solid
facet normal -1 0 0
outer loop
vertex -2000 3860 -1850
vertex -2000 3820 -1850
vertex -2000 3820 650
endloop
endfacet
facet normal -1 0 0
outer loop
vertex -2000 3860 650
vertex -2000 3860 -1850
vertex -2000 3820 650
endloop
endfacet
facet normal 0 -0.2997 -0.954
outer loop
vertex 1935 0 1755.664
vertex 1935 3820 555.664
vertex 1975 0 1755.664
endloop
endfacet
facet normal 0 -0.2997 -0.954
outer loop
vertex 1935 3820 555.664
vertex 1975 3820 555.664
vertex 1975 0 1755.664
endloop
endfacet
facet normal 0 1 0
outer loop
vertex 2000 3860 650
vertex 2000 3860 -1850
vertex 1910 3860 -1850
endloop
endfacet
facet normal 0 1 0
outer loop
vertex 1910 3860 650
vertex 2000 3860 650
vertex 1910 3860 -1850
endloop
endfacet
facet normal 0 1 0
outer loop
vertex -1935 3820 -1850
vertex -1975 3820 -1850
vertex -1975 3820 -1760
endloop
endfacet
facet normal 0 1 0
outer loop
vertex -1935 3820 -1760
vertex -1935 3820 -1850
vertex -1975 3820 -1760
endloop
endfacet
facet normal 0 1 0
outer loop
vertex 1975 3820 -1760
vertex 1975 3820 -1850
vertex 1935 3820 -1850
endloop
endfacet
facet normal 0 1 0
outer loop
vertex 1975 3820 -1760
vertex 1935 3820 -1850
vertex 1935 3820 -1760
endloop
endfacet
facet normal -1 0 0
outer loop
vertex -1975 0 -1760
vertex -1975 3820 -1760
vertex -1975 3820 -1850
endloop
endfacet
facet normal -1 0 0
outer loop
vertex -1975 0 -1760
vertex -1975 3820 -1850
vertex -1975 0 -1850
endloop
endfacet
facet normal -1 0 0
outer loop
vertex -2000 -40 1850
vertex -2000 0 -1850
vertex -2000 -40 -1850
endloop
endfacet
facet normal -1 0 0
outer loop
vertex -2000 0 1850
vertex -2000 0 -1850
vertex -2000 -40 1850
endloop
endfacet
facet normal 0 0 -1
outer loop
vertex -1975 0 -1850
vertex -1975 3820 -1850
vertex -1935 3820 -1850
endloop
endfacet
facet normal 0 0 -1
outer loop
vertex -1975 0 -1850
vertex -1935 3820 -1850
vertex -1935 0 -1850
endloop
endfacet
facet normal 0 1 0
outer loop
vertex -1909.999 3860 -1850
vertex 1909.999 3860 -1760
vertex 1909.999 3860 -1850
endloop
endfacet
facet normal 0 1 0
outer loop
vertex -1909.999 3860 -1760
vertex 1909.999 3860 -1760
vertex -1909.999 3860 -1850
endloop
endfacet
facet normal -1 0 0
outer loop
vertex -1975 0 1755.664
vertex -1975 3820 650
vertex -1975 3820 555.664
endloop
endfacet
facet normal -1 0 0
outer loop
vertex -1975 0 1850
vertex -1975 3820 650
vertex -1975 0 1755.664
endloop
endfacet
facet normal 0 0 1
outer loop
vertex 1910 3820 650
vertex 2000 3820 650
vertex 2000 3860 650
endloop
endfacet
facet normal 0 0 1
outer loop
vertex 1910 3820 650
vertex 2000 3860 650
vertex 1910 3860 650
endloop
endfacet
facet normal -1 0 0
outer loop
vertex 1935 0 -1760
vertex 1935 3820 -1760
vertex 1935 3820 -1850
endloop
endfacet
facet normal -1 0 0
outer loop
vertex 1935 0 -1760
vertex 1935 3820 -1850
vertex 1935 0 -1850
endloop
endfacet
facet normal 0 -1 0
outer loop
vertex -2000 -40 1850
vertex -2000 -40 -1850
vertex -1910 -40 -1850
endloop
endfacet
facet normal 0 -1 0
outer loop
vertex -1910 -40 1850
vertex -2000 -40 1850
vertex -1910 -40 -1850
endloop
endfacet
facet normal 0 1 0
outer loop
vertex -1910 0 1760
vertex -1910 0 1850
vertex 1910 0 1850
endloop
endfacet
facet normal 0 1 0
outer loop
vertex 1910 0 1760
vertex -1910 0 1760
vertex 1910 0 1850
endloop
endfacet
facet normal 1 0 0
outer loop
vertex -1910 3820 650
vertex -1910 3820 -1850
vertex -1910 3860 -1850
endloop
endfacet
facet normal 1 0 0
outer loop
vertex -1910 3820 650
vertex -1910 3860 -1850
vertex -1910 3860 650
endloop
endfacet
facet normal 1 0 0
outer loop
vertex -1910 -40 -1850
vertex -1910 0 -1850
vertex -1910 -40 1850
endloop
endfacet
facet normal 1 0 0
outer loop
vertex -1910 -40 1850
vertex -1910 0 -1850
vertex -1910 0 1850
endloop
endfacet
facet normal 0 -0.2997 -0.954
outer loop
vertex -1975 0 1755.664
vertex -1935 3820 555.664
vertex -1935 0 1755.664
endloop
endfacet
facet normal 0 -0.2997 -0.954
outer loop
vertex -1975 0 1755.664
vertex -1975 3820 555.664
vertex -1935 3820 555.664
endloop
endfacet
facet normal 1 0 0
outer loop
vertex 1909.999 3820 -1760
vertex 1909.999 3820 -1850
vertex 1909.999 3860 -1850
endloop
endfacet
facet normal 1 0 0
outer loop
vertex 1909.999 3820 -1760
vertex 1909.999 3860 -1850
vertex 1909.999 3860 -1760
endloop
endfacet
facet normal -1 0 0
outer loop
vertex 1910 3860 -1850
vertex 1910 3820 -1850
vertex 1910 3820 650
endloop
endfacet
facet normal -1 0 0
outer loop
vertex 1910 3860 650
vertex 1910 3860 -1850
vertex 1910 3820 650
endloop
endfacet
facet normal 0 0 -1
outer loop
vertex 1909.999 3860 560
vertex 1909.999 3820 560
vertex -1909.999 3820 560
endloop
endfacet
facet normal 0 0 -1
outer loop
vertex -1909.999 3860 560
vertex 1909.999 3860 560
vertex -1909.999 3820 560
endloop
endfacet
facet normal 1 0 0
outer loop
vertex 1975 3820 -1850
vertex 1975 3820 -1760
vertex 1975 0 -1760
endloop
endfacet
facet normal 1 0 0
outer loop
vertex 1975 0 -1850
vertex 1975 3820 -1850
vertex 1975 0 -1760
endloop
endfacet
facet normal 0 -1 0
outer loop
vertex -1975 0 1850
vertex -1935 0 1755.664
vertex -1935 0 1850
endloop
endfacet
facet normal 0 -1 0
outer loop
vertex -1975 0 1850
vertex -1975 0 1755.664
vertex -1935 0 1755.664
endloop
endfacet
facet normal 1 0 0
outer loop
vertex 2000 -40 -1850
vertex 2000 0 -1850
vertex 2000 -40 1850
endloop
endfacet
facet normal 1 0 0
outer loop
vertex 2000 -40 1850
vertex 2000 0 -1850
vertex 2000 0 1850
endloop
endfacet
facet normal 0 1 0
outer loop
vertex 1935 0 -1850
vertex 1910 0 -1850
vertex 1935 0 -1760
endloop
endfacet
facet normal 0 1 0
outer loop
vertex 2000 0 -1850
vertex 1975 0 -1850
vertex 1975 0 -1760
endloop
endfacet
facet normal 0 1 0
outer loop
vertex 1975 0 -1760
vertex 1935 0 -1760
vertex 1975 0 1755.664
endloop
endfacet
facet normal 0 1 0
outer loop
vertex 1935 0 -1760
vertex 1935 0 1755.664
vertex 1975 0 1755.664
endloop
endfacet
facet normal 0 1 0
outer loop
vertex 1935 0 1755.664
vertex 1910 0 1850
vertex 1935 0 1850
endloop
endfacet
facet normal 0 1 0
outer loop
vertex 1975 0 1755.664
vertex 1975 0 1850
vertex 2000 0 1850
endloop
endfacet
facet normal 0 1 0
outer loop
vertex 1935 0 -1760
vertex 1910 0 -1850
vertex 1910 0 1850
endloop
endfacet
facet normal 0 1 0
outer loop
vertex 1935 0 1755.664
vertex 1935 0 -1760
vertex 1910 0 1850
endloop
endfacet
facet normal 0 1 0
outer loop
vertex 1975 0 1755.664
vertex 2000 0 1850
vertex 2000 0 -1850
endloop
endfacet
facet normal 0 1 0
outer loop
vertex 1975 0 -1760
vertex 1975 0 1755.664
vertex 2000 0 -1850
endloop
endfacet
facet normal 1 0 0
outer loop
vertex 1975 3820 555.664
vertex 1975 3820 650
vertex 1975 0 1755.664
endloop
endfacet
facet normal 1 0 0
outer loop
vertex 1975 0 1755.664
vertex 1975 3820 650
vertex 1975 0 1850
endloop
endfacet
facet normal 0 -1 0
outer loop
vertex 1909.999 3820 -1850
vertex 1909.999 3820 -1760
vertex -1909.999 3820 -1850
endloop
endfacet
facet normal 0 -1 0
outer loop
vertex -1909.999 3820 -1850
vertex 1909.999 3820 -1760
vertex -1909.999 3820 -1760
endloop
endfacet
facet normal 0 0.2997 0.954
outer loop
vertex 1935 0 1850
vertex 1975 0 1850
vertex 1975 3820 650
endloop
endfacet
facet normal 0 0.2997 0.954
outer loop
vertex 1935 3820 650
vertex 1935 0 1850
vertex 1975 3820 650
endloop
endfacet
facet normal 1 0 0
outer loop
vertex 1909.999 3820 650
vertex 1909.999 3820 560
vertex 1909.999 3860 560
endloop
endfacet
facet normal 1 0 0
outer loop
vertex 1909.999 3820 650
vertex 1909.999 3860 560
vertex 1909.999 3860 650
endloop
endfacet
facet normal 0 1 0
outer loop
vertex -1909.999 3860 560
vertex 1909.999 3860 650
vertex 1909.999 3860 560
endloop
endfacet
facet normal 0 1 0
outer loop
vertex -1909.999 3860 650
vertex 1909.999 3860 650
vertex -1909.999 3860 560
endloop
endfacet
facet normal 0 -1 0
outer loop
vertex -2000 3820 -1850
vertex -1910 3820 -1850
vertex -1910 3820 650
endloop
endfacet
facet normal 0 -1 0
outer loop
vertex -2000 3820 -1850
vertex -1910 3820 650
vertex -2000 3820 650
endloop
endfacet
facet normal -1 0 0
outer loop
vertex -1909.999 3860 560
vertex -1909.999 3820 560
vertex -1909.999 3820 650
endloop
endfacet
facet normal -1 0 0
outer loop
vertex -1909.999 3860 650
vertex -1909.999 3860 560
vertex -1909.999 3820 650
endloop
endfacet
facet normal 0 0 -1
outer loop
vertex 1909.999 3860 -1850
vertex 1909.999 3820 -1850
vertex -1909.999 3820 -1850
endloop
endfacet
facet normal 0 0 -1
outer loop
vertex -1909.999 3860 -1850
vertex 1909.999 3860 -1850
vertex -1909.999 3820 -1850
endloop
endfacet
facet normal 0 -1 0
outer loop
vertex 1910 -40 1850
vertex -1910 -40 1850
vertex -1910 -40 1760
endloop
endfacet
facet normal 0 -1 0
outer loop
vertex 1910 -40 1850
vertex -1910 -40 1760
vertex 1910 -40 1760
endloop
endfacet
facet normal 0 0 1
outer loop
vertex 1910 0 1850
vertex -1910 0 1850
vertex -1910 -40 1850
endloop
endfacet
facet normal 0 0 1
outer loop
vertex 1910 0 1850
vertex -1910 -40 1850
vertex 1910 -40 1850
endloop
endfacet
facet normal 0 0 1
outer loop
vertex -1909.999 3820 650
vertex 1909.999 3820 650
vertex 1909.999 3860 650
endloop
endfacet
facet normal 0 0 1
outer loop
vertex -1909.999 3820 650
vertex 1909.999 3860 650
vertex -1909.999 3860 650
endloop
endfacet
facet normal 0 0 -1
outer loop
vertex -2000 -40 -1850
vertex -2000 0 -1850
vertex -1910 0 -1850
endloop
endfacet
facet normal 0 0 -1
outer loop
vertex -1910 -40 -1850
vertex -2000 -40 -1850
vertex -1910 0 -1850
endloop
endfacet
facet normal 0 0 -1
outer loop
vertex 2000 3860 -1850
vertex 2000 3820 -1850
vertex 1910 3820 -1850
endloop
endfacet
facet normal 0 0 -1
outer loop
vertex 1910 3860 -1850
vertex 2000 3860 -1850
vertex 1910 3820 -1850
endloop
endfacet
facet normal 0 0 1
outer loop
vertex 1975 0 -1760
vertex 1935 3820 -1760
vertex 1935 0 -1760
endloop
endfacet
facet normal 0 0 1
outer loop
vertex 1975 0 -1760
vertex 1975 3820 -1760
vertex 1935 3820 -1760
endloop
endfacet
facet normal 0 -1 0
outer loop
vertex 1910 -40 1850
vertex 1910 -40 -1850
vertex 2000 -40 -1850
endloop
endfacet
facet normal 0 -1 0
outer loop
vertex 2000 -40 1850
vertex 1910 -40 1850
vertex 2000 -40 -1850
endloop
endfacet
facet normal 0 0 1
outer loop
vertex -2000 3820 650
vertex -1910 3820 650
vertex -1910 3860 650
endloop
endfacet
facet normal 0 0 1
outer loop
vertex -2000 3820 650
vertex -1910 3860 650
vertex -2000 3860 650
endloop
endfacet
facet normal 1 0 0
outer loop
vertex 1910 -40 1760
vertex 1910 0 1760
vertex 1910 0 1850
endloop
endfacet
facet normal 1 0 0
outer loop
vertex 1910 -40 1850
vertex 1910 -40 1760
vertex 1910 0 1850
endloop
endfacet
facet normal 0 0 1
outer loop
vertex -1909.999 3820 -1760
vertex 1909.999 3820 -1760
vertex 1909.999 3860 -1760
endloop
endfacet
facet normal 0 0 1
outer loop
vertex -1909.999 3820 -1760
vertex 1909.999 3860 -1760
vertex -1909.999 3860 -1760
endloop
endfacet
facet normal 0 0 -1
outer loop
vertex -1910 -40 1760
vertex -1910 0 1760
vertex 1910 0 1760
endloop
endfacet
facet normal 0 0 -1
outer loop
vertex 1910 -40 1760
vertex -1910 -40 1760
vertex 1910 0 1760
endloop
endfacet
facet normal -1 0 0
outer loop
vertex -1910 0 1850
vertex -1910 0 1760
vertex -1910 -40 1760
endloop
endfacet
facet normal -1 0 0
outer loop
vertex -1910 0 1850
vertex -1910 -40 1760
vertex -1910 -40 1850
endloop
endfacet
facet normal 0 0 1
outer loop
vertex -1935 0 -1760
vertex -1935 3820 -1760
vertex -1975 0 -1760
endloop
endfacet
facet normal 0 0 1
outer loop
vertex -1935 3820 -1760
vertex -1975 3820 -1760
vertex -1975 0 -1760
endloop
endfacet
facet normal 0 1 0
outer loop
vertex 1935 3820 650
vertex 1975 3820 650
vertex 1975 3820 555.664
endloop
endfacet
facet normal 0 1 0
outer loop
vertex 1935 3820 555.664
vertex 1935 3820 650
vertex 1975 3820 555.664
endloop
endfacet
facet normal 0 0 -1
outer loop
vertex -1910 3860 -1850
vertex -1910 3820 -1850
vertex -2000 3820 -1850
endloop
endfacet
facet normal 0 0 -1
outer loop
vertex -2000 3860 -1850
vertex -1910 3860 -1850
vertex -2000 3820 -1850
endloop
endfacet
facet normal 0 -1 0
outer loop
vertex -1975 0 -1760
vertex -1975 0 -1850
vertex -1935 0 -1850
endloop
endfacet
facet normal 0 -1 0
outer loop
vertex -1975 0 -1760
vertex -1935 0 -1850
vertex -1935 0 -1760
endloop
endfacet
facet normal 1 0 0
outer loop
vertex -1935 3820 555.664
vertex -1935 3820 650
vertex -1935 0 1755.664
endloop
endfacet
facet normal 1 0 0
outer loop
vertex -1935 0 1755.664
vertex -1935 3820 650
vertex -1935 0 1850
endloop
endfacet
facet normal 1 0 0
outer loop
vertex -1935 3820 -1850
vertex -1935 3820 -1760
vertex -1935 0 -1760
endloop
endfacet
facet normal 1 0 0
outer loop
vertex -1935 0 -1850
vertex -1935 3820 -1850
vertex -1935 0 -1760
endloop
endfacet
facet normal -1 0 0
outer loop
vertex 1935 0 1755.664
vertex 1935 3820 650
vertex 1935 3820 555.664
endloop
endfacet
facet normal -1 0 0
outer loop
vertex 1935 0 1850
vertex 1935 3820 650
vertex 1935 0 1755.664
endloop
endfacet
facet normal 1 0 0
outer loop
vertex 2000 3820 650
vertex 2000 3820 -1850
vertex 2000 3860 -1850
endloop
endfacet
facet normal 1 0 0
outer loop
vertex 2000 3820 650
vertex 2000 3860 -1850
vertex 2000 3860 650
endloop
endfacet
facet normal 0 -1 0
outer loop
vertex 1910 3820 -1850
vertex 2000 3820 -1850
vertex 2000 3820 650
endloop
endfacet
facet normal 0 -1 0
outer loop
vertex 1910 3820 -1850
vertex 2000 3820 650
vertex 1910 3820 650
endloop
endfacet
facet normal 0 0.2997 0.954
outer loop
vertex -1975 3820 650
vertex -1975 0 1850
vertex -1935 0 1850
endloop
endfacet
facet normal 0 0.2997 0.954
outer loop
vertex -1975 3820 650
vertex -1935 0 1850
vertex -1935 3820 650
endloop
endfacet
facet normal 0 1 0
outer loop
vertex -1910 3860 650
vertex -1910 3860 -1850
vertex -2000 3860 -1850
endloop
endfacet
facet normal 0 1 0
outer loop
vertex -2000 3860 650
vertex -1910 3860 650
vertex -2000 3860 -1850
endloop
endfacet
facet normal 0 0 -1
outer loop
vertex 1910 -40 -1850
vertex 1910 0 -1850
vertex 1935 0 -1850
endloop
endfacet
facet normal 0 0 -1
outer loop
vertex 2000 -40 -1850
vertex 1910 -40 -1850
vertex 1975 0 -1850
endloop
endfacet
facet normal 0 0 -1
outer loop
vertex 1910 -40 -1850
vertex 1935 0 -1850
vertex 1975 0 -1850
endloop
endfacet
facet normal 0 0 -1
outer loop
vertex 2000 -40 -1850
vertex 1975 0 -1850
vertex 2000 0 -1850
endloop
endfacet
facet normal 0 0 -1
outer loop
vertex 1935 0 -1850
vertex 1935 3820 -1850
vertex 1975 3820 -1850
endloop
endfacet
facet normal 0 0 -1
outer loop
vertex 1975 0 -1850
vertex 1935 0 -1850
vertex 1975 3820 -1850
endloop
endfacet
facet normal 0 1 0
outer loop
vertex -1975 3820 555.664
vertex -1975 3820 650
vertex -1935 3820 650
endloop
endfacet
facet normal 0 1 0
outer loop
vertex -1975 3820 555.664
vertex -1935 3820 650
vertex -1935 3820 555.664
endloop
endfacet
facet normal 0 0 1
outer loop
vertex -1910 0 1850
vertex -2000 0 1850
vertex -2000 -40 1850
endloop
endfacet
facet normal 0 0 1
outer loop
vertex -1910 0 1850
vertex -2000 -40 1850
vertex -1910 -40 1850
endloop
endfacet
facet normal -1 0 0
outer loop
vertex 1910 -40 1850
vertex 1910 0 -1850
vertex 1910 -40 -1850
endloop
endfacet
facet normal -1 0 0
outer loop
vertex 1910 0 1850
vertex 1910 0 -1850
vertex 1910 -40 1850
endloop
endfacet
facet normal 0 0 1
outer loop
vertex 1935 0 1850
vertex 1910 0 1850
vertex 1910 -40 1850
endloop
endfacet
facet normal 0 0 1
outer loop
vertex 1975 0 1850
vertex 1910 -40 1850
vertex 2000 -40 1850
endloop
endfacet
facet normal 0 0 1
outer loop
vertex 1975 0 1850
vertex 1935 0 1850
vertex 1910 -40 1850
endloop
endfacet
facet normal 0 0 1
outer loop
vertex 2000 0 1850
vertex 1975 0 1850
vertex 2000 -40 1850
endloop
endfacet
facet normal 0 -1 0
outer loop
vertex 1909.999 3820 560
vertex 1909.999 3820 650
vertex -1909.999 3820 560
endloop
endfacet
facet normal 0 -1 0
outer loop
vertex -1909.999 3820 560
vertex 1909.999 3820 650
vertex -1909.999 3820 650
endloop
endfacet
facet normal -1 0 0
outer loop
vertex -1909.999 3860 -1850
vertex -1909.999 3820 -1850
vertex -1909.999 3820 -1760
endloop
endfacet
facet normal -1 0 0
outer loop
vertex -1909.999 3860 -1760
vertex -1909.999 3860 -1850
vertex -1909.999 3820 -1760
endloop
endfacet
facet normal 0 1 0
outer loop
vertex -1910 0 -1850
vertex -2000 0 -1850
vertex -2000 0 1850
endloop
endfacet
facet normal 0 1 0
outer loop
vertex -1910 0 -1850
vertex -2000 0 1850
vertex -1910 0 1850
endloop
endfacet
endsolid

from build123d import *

# Parameters (mm, degrees)
F1_W          = 90
F1_H          = 3700
F2_DEPTH      = 40
F3_W          = 3820
F3_H          = 90
F4_DEPTH      = 40
F8_DEPTH      = 20
F8_DEPTH_BACK = 20
F7_W          = 3820
F7_H          = 90
F10_W         = 90
F10_H         = 2500
F11_DEPTH     = 40
F10_W_2       = 3819.998
F10_H_2       = 90


with BuildPart() as f2:
    # F1 (on Front) → F2 (new body)
    with BuildSketch(Plane.XZ):
        with Locations((-1955, 0)):
            Rectangle(F1_W, F1_H)
    extrude(amount=F2_DEPTH)


with BuildPart() as f2b:
    # F1 (on Front) → F2, piece 2 (new body)
    with BuildSketch(Plane.XZ):
        with Locations((1955, 0)):
            Rectangle(F1_W, F1_H)
    extrude(amount=F2_DEPTH)

    # F9: F8, F8b across plane


with BuildPart() as f4:
    # F3 (on face) → F4 (new body)
    with BuildSketch(Plane.XZ):
        with Locations((0, 1805)):
            Rectangle(F3_W, F3_H)
    extrude(amount=F4_DEPTH)


with BuildPart() as f8:
    # F7 (on offset) → F8 (new body, two sides)
    with BuildSketch(Plane(origin=(-1955, 0, 0), x_dir=(0, -1, 0), z_dir=(-1, 0, 0))) as f8_sk:
        Polygon((0, 1755.6637917124), (0, 1850), (-3820, 650), (-3820, 555.6637917124), align=None)
    extrude(amount=F8_DEPTH)
    extrude(f8_sk.sketch, amount=-F8_DEPTH_BACK)


with BuildPart() as f8b:
    # F7 (on offset) → F8, piece 2 (new body, two sides)
    with BuildSketch(Plane(origin=(-1955, 0, 0), x_dir=(0, -1, 0), z_dir=(-1, 0, 0))) as f8_2_sk:
        with Locations((-1910, -1805)):
            Rectangle(F7_W, F7_H)
    extrude(amount=F8_DEPTH)
    extrude(f8_2_sk.sketch, amount=-F8_DEPTH_BACK)


with BuildPart() as f2b_1:
    add(f2b.part)
    add(f8.part.mirror(Plane.YZ))
    add(f8b.part.mirror(Plane.YZ))


with BuildPart() as f11:
    # F10 (on face) → F11 (new body)
    with BuildSketch(Plane(origin=(0, 3820, 0), x_dir=(-1, 0, 0), z_dir=(0, 1, 0))):
        with Locations((-1955, -600)):
            Rectangle(F10_W, F10_H)
    extrude(amount=F11_DEPTH)


with BuildPart() as f11b:
    # F10 (on face) → F11, piece 2 (new body)
    with BuildSketch(Plane(origin=(0, 3820, 0), x_dir=(-1, 0, 0), z_dir=(0, 1, 0))):
        with Locations((1955, -600)):
            Rectangle(F10_W, F10_H)
    extrude(amount=F11_DEPTH)


with BuildPart() as f11c:
    # F10 (on face) → F11, piece 3 (new body)
    with BuildSketch(Plane(origin=(0, 3820, 0), x_dir=(-1, 0, 0), z_dir=(0, 1, 0))):
        with Locations((0, 605)):
            Rectangle(F10_W_2, F10_H_2)
    extrude(amount=F11_DEPTH)


with BuildPart() as f11d:
    # F10 (on face) → F11, piece 4 (new body)
    with BuildSketch(Plane(origin=(0, 3820, 0), x_dir=(-1, 0, 0), z_dir=(0, 1, 0))):
        with Locations((0, -1805)):
            Rectangle(F10_W_2, F10_H_2)
    extrude(amount=F11_DEPTH)


solid = Compound([f2.part, f4.part, f8.part, f8b.part, f2b_1.part, f11.part, f11b.part, f11c.part, f11d.part])
